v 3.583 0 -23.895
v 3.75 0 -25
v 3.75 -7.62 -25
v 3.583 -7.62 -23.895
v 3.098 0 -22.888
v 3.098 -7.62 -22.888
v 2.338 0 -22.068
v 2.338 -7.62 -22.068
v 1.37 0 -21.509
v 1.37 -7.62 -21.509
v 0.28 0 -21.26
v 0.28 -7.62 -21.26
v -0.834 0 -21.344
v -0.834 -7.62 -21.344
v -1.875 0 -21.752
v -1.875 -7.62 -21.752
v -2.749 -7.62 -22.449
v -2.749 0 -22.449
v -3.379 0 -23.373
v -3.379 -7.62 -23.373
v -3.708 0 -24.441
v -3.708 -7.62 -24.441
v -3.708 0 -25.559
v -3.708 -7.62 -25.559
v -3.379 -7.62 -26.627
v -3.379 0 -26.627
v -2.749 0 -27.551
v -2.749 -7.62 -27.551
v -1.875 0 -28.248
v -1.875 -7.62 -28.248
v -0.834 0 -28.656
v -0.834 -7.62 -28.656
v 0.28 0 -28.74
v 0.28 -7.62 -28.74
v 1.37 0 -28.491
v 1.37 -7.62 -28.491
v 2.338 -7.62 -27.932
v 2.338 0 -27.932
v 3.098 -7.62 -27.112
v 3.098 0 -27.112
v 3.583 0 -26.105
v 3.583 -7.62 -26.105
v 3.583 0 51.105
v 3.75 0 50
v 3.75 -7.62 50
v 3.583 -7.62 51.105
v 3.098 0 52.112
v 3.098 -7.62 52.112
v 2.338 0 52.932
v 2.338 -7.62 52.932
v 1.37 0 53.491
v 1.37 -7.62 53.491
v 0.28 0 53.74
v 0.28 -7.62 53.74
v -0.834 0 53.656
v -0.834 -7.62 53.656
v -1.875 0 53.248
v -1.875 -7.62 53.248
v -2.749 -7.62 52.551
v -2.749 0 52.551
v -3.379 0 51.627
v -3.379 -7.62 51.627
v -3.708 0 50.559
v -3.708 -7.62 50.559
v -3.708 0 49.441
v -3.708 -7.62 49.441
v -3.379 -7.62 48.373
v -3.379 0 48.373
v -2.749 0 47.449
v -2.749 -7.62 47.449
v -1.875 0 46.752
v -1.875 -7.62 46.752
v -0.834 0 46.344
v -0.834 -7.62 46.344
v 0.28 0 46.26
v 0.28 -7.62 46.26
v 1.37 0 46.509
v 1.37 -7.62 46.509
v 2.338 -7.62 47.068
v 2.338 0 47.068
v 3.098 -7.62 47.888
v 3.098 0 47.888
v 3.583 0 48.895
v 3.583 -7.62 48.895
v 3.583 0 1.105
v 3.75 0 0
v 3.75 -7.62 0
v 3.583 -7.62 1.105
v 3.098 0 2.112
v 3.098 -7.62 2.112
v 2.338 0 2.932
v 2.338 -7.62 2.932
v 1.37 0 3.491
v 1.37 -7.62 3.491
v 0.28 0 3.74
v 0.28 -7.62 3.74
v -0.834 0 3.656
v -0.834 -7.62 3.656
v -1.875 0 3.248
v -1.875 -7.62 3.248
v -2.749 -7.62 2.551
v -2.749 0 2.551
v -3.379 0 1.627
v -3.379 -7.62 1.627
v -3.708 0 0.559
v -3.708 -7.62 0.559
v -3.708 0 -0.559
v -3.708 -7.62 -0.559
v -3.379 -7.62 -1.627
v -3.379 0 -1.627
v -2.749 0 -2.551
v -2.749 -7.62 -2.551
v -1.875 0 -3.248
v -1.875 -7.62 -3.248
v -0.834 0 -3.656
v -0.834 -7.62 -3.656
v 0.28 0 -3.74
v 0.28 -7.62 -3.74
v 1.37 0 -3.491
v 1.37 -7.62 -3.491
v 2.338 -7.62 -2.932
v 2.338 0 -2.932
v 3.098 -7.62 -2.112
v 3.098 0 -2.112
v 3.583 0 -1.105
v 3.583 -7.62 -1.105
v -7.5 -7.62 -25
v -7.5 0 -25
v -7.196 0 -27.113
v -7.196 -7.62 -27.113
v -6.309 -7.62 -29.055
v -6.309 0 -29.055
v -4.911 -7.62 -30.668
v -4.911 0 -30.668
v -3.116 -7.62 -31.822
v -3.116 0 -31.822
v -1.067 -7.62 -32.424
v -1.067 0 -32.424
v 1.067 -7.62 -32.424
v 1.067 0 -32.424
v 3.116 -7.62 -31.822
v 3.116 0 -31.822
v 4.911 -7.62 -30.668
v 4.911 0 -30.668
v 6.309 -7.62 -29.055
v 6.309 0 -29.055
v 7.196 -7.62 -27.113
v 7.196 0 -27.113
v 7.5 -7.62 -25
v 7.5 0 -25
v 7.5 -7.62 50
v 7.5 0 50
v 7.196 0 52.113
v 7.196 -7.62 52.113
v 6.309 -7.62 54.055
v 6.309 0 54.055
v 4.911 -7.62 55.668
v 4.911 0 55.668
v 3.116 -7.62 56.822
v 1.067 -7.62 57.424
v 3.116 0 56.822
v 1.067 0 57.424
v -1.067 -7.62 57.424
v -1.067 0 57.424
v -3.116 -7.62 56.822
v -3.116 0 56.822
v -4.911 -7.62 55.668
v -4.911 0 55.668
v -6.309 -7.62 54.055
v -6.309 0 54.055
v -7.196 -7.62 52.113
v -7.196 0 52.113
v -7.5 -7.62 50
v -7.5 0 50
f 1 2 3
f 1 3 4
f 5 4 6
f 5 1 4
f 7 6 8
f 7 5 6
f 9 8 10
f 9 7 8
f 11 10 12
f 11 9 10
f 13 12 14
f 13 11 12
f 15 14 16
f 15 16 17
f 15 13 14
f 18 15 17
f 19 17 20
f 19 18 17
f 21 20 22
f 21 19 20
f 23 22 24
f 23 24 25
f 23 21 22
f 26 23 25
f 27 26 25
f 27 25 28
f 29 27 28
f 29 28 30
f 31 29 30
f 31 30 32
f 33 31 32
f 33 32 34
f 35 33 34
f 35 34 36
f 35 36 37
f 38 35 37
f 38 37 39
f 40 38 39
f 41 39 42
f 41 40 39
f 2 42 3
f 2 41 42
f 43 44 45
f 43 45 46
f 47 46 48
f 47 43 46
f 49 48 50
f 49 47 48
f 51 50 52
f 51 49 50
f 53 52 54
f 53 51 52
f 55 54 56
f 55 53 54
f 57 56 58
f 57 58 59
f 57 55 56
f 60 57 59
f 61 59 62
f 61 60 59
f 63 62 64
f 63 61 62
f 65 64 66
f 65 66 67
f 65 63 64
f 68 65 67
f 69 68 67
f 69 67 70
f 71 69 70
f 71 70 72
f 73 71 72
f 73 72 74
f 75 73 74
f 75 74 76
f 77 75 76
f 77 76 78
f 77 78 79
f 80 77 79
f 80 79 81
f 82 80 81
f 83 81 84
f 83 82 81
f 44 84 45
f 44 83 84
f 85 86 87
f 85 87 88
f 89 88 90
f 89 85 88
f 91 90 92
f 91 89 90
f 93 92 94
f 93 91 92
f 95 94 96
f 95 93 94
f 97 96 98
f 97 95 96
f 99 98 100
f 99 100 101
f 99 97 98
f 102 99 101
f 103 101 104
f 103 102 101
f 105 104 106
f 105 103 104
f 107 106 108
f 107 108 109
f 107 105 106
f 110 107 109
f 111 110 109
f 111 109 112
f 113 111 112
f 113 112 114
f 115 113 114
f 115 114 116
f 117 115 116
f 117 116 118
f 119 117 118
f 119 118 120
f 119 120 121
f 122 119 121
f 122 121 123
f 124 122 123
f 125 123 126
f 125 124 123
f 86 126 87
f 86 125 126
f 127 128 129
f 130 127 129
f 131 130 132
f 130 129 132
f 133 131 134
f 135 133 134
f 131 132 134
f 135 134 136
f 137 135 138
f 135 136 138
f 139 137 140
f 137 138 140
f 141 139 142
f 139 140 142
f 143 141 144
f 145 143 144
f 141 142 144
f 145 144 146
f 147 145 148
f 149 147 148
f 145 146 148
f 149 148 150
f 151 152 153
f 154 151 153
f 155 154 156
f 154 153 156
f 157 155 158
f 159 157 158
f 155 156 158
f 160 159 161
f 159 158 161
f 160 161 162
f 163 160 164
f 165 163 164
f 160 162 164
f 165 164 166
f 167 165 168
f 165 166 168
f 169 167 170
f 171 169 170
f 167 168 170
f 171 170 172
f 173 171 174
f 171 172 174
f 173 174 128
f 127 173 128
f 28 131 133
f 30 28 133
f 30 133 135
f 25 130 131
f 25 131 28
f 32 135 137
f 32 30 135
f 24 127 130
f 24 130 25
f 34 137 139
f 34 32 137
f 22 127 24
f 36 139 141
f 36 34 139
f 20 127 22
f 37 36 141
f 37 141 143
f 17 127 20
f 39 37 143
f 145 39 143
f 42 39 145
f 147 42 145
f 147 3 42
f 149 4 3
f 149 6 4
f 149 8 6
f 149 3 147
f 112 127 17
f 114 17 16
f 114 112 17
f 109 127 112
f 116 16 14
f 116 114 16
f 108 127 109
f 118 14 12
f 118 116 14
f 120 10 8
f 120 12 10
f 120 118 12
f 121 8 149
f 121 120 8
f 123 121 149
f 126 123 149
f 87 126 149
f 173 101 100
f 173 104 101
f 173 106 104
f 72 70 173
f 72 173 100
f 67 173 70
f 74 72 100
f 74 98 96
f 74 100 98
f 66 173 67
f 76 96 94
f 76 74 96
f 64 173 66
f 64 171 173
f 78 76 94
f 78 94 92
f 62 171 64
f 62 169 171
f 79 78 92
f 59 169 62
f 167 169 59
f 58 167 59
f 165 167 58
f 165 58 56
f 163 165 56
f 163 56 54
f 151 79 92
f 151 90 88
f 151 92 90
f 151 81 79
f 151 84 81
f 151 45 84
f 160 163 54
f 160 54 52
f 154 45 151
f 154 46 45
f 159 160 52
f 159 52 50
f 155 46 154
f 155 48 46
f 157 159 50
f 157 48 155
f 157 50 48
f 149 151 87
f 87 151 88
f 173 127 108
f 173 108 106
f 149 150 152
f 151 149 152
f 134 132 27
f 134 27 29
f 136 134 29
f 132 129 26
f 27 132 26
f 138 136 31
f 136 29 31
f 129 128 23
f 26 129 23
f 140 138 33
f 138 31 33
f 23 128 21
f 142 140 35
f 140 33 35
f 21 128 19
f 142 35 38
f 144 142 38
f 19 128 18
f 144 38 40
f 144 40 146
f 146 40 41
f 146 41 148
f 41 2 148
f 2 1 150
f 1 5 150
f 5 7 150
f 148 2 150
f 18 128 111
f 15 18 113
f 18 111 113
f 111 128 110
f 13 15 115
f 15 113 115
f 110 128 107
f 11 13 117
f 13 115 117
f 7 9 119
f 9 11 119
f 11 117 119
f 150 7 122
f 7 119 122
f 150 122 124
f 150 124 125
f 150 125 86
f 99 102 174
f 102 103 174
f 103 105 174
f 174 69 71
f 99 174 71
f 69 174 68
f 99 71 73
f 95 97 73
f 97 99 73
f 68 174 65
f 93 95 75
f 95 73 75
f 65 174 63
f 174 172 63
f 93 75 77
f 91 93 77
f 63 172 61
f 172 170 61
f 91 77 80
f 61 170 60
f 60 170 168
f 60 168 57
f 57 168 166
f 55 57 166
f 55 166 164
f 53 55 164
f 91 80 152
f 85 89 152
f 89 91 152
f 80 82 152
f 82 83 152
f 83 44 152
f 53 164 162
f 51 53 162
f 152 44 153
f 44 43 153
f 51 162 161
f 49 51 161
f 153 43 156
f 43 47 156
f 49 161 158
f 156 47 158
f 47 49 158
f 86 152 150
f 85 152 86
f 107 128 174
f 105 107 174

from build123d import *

# Parameters (mm, degrees)
F0_R     = 3.75
F1_DEPTH = 7.62


with BuildPart() as f1:
    # F0 (on Front) → F1 (new body)
    with BuildSketch(Plane.XZ):
        with BuildLine():
            ThreePointArc((-7.5, -25), (0, -32.5), (7.5, -25))
            ThreePointArc((7.5, -25), (0, -17.5), (-7.5, -25))
        make_face()
        with Locations((0, -25)):
            Circle(F0_R, mode=Mode.SUBTRACT)
        with BuildLine():
            ThreePointArc((-7.5, -25), (0, -17.5), (7.5, -25))
            Line((7.5, -25), (7.5, 50))
            ThreePointArc((7.5, 50), (0, 42.5), (-7.5, 50))
            Line((-7.5, 50), (-7.5, -25))
        make_face()
        Circle(F0_R, mode=Mode.SUBTRACT)
        with BuildLine():
            ThreePointArc((-7.5, 50), (0, 42.5), (7.5, 50))
            ThreePointArc((7.5, 50), (0, 57.5), (-7.5, 50))
        make_face()
        with Locations((0, 50)):
            Circle(F0_R, mode=Mode.SUBTRACT)
    extrude(amount=F1_DEPTH)


solid = f1.part
